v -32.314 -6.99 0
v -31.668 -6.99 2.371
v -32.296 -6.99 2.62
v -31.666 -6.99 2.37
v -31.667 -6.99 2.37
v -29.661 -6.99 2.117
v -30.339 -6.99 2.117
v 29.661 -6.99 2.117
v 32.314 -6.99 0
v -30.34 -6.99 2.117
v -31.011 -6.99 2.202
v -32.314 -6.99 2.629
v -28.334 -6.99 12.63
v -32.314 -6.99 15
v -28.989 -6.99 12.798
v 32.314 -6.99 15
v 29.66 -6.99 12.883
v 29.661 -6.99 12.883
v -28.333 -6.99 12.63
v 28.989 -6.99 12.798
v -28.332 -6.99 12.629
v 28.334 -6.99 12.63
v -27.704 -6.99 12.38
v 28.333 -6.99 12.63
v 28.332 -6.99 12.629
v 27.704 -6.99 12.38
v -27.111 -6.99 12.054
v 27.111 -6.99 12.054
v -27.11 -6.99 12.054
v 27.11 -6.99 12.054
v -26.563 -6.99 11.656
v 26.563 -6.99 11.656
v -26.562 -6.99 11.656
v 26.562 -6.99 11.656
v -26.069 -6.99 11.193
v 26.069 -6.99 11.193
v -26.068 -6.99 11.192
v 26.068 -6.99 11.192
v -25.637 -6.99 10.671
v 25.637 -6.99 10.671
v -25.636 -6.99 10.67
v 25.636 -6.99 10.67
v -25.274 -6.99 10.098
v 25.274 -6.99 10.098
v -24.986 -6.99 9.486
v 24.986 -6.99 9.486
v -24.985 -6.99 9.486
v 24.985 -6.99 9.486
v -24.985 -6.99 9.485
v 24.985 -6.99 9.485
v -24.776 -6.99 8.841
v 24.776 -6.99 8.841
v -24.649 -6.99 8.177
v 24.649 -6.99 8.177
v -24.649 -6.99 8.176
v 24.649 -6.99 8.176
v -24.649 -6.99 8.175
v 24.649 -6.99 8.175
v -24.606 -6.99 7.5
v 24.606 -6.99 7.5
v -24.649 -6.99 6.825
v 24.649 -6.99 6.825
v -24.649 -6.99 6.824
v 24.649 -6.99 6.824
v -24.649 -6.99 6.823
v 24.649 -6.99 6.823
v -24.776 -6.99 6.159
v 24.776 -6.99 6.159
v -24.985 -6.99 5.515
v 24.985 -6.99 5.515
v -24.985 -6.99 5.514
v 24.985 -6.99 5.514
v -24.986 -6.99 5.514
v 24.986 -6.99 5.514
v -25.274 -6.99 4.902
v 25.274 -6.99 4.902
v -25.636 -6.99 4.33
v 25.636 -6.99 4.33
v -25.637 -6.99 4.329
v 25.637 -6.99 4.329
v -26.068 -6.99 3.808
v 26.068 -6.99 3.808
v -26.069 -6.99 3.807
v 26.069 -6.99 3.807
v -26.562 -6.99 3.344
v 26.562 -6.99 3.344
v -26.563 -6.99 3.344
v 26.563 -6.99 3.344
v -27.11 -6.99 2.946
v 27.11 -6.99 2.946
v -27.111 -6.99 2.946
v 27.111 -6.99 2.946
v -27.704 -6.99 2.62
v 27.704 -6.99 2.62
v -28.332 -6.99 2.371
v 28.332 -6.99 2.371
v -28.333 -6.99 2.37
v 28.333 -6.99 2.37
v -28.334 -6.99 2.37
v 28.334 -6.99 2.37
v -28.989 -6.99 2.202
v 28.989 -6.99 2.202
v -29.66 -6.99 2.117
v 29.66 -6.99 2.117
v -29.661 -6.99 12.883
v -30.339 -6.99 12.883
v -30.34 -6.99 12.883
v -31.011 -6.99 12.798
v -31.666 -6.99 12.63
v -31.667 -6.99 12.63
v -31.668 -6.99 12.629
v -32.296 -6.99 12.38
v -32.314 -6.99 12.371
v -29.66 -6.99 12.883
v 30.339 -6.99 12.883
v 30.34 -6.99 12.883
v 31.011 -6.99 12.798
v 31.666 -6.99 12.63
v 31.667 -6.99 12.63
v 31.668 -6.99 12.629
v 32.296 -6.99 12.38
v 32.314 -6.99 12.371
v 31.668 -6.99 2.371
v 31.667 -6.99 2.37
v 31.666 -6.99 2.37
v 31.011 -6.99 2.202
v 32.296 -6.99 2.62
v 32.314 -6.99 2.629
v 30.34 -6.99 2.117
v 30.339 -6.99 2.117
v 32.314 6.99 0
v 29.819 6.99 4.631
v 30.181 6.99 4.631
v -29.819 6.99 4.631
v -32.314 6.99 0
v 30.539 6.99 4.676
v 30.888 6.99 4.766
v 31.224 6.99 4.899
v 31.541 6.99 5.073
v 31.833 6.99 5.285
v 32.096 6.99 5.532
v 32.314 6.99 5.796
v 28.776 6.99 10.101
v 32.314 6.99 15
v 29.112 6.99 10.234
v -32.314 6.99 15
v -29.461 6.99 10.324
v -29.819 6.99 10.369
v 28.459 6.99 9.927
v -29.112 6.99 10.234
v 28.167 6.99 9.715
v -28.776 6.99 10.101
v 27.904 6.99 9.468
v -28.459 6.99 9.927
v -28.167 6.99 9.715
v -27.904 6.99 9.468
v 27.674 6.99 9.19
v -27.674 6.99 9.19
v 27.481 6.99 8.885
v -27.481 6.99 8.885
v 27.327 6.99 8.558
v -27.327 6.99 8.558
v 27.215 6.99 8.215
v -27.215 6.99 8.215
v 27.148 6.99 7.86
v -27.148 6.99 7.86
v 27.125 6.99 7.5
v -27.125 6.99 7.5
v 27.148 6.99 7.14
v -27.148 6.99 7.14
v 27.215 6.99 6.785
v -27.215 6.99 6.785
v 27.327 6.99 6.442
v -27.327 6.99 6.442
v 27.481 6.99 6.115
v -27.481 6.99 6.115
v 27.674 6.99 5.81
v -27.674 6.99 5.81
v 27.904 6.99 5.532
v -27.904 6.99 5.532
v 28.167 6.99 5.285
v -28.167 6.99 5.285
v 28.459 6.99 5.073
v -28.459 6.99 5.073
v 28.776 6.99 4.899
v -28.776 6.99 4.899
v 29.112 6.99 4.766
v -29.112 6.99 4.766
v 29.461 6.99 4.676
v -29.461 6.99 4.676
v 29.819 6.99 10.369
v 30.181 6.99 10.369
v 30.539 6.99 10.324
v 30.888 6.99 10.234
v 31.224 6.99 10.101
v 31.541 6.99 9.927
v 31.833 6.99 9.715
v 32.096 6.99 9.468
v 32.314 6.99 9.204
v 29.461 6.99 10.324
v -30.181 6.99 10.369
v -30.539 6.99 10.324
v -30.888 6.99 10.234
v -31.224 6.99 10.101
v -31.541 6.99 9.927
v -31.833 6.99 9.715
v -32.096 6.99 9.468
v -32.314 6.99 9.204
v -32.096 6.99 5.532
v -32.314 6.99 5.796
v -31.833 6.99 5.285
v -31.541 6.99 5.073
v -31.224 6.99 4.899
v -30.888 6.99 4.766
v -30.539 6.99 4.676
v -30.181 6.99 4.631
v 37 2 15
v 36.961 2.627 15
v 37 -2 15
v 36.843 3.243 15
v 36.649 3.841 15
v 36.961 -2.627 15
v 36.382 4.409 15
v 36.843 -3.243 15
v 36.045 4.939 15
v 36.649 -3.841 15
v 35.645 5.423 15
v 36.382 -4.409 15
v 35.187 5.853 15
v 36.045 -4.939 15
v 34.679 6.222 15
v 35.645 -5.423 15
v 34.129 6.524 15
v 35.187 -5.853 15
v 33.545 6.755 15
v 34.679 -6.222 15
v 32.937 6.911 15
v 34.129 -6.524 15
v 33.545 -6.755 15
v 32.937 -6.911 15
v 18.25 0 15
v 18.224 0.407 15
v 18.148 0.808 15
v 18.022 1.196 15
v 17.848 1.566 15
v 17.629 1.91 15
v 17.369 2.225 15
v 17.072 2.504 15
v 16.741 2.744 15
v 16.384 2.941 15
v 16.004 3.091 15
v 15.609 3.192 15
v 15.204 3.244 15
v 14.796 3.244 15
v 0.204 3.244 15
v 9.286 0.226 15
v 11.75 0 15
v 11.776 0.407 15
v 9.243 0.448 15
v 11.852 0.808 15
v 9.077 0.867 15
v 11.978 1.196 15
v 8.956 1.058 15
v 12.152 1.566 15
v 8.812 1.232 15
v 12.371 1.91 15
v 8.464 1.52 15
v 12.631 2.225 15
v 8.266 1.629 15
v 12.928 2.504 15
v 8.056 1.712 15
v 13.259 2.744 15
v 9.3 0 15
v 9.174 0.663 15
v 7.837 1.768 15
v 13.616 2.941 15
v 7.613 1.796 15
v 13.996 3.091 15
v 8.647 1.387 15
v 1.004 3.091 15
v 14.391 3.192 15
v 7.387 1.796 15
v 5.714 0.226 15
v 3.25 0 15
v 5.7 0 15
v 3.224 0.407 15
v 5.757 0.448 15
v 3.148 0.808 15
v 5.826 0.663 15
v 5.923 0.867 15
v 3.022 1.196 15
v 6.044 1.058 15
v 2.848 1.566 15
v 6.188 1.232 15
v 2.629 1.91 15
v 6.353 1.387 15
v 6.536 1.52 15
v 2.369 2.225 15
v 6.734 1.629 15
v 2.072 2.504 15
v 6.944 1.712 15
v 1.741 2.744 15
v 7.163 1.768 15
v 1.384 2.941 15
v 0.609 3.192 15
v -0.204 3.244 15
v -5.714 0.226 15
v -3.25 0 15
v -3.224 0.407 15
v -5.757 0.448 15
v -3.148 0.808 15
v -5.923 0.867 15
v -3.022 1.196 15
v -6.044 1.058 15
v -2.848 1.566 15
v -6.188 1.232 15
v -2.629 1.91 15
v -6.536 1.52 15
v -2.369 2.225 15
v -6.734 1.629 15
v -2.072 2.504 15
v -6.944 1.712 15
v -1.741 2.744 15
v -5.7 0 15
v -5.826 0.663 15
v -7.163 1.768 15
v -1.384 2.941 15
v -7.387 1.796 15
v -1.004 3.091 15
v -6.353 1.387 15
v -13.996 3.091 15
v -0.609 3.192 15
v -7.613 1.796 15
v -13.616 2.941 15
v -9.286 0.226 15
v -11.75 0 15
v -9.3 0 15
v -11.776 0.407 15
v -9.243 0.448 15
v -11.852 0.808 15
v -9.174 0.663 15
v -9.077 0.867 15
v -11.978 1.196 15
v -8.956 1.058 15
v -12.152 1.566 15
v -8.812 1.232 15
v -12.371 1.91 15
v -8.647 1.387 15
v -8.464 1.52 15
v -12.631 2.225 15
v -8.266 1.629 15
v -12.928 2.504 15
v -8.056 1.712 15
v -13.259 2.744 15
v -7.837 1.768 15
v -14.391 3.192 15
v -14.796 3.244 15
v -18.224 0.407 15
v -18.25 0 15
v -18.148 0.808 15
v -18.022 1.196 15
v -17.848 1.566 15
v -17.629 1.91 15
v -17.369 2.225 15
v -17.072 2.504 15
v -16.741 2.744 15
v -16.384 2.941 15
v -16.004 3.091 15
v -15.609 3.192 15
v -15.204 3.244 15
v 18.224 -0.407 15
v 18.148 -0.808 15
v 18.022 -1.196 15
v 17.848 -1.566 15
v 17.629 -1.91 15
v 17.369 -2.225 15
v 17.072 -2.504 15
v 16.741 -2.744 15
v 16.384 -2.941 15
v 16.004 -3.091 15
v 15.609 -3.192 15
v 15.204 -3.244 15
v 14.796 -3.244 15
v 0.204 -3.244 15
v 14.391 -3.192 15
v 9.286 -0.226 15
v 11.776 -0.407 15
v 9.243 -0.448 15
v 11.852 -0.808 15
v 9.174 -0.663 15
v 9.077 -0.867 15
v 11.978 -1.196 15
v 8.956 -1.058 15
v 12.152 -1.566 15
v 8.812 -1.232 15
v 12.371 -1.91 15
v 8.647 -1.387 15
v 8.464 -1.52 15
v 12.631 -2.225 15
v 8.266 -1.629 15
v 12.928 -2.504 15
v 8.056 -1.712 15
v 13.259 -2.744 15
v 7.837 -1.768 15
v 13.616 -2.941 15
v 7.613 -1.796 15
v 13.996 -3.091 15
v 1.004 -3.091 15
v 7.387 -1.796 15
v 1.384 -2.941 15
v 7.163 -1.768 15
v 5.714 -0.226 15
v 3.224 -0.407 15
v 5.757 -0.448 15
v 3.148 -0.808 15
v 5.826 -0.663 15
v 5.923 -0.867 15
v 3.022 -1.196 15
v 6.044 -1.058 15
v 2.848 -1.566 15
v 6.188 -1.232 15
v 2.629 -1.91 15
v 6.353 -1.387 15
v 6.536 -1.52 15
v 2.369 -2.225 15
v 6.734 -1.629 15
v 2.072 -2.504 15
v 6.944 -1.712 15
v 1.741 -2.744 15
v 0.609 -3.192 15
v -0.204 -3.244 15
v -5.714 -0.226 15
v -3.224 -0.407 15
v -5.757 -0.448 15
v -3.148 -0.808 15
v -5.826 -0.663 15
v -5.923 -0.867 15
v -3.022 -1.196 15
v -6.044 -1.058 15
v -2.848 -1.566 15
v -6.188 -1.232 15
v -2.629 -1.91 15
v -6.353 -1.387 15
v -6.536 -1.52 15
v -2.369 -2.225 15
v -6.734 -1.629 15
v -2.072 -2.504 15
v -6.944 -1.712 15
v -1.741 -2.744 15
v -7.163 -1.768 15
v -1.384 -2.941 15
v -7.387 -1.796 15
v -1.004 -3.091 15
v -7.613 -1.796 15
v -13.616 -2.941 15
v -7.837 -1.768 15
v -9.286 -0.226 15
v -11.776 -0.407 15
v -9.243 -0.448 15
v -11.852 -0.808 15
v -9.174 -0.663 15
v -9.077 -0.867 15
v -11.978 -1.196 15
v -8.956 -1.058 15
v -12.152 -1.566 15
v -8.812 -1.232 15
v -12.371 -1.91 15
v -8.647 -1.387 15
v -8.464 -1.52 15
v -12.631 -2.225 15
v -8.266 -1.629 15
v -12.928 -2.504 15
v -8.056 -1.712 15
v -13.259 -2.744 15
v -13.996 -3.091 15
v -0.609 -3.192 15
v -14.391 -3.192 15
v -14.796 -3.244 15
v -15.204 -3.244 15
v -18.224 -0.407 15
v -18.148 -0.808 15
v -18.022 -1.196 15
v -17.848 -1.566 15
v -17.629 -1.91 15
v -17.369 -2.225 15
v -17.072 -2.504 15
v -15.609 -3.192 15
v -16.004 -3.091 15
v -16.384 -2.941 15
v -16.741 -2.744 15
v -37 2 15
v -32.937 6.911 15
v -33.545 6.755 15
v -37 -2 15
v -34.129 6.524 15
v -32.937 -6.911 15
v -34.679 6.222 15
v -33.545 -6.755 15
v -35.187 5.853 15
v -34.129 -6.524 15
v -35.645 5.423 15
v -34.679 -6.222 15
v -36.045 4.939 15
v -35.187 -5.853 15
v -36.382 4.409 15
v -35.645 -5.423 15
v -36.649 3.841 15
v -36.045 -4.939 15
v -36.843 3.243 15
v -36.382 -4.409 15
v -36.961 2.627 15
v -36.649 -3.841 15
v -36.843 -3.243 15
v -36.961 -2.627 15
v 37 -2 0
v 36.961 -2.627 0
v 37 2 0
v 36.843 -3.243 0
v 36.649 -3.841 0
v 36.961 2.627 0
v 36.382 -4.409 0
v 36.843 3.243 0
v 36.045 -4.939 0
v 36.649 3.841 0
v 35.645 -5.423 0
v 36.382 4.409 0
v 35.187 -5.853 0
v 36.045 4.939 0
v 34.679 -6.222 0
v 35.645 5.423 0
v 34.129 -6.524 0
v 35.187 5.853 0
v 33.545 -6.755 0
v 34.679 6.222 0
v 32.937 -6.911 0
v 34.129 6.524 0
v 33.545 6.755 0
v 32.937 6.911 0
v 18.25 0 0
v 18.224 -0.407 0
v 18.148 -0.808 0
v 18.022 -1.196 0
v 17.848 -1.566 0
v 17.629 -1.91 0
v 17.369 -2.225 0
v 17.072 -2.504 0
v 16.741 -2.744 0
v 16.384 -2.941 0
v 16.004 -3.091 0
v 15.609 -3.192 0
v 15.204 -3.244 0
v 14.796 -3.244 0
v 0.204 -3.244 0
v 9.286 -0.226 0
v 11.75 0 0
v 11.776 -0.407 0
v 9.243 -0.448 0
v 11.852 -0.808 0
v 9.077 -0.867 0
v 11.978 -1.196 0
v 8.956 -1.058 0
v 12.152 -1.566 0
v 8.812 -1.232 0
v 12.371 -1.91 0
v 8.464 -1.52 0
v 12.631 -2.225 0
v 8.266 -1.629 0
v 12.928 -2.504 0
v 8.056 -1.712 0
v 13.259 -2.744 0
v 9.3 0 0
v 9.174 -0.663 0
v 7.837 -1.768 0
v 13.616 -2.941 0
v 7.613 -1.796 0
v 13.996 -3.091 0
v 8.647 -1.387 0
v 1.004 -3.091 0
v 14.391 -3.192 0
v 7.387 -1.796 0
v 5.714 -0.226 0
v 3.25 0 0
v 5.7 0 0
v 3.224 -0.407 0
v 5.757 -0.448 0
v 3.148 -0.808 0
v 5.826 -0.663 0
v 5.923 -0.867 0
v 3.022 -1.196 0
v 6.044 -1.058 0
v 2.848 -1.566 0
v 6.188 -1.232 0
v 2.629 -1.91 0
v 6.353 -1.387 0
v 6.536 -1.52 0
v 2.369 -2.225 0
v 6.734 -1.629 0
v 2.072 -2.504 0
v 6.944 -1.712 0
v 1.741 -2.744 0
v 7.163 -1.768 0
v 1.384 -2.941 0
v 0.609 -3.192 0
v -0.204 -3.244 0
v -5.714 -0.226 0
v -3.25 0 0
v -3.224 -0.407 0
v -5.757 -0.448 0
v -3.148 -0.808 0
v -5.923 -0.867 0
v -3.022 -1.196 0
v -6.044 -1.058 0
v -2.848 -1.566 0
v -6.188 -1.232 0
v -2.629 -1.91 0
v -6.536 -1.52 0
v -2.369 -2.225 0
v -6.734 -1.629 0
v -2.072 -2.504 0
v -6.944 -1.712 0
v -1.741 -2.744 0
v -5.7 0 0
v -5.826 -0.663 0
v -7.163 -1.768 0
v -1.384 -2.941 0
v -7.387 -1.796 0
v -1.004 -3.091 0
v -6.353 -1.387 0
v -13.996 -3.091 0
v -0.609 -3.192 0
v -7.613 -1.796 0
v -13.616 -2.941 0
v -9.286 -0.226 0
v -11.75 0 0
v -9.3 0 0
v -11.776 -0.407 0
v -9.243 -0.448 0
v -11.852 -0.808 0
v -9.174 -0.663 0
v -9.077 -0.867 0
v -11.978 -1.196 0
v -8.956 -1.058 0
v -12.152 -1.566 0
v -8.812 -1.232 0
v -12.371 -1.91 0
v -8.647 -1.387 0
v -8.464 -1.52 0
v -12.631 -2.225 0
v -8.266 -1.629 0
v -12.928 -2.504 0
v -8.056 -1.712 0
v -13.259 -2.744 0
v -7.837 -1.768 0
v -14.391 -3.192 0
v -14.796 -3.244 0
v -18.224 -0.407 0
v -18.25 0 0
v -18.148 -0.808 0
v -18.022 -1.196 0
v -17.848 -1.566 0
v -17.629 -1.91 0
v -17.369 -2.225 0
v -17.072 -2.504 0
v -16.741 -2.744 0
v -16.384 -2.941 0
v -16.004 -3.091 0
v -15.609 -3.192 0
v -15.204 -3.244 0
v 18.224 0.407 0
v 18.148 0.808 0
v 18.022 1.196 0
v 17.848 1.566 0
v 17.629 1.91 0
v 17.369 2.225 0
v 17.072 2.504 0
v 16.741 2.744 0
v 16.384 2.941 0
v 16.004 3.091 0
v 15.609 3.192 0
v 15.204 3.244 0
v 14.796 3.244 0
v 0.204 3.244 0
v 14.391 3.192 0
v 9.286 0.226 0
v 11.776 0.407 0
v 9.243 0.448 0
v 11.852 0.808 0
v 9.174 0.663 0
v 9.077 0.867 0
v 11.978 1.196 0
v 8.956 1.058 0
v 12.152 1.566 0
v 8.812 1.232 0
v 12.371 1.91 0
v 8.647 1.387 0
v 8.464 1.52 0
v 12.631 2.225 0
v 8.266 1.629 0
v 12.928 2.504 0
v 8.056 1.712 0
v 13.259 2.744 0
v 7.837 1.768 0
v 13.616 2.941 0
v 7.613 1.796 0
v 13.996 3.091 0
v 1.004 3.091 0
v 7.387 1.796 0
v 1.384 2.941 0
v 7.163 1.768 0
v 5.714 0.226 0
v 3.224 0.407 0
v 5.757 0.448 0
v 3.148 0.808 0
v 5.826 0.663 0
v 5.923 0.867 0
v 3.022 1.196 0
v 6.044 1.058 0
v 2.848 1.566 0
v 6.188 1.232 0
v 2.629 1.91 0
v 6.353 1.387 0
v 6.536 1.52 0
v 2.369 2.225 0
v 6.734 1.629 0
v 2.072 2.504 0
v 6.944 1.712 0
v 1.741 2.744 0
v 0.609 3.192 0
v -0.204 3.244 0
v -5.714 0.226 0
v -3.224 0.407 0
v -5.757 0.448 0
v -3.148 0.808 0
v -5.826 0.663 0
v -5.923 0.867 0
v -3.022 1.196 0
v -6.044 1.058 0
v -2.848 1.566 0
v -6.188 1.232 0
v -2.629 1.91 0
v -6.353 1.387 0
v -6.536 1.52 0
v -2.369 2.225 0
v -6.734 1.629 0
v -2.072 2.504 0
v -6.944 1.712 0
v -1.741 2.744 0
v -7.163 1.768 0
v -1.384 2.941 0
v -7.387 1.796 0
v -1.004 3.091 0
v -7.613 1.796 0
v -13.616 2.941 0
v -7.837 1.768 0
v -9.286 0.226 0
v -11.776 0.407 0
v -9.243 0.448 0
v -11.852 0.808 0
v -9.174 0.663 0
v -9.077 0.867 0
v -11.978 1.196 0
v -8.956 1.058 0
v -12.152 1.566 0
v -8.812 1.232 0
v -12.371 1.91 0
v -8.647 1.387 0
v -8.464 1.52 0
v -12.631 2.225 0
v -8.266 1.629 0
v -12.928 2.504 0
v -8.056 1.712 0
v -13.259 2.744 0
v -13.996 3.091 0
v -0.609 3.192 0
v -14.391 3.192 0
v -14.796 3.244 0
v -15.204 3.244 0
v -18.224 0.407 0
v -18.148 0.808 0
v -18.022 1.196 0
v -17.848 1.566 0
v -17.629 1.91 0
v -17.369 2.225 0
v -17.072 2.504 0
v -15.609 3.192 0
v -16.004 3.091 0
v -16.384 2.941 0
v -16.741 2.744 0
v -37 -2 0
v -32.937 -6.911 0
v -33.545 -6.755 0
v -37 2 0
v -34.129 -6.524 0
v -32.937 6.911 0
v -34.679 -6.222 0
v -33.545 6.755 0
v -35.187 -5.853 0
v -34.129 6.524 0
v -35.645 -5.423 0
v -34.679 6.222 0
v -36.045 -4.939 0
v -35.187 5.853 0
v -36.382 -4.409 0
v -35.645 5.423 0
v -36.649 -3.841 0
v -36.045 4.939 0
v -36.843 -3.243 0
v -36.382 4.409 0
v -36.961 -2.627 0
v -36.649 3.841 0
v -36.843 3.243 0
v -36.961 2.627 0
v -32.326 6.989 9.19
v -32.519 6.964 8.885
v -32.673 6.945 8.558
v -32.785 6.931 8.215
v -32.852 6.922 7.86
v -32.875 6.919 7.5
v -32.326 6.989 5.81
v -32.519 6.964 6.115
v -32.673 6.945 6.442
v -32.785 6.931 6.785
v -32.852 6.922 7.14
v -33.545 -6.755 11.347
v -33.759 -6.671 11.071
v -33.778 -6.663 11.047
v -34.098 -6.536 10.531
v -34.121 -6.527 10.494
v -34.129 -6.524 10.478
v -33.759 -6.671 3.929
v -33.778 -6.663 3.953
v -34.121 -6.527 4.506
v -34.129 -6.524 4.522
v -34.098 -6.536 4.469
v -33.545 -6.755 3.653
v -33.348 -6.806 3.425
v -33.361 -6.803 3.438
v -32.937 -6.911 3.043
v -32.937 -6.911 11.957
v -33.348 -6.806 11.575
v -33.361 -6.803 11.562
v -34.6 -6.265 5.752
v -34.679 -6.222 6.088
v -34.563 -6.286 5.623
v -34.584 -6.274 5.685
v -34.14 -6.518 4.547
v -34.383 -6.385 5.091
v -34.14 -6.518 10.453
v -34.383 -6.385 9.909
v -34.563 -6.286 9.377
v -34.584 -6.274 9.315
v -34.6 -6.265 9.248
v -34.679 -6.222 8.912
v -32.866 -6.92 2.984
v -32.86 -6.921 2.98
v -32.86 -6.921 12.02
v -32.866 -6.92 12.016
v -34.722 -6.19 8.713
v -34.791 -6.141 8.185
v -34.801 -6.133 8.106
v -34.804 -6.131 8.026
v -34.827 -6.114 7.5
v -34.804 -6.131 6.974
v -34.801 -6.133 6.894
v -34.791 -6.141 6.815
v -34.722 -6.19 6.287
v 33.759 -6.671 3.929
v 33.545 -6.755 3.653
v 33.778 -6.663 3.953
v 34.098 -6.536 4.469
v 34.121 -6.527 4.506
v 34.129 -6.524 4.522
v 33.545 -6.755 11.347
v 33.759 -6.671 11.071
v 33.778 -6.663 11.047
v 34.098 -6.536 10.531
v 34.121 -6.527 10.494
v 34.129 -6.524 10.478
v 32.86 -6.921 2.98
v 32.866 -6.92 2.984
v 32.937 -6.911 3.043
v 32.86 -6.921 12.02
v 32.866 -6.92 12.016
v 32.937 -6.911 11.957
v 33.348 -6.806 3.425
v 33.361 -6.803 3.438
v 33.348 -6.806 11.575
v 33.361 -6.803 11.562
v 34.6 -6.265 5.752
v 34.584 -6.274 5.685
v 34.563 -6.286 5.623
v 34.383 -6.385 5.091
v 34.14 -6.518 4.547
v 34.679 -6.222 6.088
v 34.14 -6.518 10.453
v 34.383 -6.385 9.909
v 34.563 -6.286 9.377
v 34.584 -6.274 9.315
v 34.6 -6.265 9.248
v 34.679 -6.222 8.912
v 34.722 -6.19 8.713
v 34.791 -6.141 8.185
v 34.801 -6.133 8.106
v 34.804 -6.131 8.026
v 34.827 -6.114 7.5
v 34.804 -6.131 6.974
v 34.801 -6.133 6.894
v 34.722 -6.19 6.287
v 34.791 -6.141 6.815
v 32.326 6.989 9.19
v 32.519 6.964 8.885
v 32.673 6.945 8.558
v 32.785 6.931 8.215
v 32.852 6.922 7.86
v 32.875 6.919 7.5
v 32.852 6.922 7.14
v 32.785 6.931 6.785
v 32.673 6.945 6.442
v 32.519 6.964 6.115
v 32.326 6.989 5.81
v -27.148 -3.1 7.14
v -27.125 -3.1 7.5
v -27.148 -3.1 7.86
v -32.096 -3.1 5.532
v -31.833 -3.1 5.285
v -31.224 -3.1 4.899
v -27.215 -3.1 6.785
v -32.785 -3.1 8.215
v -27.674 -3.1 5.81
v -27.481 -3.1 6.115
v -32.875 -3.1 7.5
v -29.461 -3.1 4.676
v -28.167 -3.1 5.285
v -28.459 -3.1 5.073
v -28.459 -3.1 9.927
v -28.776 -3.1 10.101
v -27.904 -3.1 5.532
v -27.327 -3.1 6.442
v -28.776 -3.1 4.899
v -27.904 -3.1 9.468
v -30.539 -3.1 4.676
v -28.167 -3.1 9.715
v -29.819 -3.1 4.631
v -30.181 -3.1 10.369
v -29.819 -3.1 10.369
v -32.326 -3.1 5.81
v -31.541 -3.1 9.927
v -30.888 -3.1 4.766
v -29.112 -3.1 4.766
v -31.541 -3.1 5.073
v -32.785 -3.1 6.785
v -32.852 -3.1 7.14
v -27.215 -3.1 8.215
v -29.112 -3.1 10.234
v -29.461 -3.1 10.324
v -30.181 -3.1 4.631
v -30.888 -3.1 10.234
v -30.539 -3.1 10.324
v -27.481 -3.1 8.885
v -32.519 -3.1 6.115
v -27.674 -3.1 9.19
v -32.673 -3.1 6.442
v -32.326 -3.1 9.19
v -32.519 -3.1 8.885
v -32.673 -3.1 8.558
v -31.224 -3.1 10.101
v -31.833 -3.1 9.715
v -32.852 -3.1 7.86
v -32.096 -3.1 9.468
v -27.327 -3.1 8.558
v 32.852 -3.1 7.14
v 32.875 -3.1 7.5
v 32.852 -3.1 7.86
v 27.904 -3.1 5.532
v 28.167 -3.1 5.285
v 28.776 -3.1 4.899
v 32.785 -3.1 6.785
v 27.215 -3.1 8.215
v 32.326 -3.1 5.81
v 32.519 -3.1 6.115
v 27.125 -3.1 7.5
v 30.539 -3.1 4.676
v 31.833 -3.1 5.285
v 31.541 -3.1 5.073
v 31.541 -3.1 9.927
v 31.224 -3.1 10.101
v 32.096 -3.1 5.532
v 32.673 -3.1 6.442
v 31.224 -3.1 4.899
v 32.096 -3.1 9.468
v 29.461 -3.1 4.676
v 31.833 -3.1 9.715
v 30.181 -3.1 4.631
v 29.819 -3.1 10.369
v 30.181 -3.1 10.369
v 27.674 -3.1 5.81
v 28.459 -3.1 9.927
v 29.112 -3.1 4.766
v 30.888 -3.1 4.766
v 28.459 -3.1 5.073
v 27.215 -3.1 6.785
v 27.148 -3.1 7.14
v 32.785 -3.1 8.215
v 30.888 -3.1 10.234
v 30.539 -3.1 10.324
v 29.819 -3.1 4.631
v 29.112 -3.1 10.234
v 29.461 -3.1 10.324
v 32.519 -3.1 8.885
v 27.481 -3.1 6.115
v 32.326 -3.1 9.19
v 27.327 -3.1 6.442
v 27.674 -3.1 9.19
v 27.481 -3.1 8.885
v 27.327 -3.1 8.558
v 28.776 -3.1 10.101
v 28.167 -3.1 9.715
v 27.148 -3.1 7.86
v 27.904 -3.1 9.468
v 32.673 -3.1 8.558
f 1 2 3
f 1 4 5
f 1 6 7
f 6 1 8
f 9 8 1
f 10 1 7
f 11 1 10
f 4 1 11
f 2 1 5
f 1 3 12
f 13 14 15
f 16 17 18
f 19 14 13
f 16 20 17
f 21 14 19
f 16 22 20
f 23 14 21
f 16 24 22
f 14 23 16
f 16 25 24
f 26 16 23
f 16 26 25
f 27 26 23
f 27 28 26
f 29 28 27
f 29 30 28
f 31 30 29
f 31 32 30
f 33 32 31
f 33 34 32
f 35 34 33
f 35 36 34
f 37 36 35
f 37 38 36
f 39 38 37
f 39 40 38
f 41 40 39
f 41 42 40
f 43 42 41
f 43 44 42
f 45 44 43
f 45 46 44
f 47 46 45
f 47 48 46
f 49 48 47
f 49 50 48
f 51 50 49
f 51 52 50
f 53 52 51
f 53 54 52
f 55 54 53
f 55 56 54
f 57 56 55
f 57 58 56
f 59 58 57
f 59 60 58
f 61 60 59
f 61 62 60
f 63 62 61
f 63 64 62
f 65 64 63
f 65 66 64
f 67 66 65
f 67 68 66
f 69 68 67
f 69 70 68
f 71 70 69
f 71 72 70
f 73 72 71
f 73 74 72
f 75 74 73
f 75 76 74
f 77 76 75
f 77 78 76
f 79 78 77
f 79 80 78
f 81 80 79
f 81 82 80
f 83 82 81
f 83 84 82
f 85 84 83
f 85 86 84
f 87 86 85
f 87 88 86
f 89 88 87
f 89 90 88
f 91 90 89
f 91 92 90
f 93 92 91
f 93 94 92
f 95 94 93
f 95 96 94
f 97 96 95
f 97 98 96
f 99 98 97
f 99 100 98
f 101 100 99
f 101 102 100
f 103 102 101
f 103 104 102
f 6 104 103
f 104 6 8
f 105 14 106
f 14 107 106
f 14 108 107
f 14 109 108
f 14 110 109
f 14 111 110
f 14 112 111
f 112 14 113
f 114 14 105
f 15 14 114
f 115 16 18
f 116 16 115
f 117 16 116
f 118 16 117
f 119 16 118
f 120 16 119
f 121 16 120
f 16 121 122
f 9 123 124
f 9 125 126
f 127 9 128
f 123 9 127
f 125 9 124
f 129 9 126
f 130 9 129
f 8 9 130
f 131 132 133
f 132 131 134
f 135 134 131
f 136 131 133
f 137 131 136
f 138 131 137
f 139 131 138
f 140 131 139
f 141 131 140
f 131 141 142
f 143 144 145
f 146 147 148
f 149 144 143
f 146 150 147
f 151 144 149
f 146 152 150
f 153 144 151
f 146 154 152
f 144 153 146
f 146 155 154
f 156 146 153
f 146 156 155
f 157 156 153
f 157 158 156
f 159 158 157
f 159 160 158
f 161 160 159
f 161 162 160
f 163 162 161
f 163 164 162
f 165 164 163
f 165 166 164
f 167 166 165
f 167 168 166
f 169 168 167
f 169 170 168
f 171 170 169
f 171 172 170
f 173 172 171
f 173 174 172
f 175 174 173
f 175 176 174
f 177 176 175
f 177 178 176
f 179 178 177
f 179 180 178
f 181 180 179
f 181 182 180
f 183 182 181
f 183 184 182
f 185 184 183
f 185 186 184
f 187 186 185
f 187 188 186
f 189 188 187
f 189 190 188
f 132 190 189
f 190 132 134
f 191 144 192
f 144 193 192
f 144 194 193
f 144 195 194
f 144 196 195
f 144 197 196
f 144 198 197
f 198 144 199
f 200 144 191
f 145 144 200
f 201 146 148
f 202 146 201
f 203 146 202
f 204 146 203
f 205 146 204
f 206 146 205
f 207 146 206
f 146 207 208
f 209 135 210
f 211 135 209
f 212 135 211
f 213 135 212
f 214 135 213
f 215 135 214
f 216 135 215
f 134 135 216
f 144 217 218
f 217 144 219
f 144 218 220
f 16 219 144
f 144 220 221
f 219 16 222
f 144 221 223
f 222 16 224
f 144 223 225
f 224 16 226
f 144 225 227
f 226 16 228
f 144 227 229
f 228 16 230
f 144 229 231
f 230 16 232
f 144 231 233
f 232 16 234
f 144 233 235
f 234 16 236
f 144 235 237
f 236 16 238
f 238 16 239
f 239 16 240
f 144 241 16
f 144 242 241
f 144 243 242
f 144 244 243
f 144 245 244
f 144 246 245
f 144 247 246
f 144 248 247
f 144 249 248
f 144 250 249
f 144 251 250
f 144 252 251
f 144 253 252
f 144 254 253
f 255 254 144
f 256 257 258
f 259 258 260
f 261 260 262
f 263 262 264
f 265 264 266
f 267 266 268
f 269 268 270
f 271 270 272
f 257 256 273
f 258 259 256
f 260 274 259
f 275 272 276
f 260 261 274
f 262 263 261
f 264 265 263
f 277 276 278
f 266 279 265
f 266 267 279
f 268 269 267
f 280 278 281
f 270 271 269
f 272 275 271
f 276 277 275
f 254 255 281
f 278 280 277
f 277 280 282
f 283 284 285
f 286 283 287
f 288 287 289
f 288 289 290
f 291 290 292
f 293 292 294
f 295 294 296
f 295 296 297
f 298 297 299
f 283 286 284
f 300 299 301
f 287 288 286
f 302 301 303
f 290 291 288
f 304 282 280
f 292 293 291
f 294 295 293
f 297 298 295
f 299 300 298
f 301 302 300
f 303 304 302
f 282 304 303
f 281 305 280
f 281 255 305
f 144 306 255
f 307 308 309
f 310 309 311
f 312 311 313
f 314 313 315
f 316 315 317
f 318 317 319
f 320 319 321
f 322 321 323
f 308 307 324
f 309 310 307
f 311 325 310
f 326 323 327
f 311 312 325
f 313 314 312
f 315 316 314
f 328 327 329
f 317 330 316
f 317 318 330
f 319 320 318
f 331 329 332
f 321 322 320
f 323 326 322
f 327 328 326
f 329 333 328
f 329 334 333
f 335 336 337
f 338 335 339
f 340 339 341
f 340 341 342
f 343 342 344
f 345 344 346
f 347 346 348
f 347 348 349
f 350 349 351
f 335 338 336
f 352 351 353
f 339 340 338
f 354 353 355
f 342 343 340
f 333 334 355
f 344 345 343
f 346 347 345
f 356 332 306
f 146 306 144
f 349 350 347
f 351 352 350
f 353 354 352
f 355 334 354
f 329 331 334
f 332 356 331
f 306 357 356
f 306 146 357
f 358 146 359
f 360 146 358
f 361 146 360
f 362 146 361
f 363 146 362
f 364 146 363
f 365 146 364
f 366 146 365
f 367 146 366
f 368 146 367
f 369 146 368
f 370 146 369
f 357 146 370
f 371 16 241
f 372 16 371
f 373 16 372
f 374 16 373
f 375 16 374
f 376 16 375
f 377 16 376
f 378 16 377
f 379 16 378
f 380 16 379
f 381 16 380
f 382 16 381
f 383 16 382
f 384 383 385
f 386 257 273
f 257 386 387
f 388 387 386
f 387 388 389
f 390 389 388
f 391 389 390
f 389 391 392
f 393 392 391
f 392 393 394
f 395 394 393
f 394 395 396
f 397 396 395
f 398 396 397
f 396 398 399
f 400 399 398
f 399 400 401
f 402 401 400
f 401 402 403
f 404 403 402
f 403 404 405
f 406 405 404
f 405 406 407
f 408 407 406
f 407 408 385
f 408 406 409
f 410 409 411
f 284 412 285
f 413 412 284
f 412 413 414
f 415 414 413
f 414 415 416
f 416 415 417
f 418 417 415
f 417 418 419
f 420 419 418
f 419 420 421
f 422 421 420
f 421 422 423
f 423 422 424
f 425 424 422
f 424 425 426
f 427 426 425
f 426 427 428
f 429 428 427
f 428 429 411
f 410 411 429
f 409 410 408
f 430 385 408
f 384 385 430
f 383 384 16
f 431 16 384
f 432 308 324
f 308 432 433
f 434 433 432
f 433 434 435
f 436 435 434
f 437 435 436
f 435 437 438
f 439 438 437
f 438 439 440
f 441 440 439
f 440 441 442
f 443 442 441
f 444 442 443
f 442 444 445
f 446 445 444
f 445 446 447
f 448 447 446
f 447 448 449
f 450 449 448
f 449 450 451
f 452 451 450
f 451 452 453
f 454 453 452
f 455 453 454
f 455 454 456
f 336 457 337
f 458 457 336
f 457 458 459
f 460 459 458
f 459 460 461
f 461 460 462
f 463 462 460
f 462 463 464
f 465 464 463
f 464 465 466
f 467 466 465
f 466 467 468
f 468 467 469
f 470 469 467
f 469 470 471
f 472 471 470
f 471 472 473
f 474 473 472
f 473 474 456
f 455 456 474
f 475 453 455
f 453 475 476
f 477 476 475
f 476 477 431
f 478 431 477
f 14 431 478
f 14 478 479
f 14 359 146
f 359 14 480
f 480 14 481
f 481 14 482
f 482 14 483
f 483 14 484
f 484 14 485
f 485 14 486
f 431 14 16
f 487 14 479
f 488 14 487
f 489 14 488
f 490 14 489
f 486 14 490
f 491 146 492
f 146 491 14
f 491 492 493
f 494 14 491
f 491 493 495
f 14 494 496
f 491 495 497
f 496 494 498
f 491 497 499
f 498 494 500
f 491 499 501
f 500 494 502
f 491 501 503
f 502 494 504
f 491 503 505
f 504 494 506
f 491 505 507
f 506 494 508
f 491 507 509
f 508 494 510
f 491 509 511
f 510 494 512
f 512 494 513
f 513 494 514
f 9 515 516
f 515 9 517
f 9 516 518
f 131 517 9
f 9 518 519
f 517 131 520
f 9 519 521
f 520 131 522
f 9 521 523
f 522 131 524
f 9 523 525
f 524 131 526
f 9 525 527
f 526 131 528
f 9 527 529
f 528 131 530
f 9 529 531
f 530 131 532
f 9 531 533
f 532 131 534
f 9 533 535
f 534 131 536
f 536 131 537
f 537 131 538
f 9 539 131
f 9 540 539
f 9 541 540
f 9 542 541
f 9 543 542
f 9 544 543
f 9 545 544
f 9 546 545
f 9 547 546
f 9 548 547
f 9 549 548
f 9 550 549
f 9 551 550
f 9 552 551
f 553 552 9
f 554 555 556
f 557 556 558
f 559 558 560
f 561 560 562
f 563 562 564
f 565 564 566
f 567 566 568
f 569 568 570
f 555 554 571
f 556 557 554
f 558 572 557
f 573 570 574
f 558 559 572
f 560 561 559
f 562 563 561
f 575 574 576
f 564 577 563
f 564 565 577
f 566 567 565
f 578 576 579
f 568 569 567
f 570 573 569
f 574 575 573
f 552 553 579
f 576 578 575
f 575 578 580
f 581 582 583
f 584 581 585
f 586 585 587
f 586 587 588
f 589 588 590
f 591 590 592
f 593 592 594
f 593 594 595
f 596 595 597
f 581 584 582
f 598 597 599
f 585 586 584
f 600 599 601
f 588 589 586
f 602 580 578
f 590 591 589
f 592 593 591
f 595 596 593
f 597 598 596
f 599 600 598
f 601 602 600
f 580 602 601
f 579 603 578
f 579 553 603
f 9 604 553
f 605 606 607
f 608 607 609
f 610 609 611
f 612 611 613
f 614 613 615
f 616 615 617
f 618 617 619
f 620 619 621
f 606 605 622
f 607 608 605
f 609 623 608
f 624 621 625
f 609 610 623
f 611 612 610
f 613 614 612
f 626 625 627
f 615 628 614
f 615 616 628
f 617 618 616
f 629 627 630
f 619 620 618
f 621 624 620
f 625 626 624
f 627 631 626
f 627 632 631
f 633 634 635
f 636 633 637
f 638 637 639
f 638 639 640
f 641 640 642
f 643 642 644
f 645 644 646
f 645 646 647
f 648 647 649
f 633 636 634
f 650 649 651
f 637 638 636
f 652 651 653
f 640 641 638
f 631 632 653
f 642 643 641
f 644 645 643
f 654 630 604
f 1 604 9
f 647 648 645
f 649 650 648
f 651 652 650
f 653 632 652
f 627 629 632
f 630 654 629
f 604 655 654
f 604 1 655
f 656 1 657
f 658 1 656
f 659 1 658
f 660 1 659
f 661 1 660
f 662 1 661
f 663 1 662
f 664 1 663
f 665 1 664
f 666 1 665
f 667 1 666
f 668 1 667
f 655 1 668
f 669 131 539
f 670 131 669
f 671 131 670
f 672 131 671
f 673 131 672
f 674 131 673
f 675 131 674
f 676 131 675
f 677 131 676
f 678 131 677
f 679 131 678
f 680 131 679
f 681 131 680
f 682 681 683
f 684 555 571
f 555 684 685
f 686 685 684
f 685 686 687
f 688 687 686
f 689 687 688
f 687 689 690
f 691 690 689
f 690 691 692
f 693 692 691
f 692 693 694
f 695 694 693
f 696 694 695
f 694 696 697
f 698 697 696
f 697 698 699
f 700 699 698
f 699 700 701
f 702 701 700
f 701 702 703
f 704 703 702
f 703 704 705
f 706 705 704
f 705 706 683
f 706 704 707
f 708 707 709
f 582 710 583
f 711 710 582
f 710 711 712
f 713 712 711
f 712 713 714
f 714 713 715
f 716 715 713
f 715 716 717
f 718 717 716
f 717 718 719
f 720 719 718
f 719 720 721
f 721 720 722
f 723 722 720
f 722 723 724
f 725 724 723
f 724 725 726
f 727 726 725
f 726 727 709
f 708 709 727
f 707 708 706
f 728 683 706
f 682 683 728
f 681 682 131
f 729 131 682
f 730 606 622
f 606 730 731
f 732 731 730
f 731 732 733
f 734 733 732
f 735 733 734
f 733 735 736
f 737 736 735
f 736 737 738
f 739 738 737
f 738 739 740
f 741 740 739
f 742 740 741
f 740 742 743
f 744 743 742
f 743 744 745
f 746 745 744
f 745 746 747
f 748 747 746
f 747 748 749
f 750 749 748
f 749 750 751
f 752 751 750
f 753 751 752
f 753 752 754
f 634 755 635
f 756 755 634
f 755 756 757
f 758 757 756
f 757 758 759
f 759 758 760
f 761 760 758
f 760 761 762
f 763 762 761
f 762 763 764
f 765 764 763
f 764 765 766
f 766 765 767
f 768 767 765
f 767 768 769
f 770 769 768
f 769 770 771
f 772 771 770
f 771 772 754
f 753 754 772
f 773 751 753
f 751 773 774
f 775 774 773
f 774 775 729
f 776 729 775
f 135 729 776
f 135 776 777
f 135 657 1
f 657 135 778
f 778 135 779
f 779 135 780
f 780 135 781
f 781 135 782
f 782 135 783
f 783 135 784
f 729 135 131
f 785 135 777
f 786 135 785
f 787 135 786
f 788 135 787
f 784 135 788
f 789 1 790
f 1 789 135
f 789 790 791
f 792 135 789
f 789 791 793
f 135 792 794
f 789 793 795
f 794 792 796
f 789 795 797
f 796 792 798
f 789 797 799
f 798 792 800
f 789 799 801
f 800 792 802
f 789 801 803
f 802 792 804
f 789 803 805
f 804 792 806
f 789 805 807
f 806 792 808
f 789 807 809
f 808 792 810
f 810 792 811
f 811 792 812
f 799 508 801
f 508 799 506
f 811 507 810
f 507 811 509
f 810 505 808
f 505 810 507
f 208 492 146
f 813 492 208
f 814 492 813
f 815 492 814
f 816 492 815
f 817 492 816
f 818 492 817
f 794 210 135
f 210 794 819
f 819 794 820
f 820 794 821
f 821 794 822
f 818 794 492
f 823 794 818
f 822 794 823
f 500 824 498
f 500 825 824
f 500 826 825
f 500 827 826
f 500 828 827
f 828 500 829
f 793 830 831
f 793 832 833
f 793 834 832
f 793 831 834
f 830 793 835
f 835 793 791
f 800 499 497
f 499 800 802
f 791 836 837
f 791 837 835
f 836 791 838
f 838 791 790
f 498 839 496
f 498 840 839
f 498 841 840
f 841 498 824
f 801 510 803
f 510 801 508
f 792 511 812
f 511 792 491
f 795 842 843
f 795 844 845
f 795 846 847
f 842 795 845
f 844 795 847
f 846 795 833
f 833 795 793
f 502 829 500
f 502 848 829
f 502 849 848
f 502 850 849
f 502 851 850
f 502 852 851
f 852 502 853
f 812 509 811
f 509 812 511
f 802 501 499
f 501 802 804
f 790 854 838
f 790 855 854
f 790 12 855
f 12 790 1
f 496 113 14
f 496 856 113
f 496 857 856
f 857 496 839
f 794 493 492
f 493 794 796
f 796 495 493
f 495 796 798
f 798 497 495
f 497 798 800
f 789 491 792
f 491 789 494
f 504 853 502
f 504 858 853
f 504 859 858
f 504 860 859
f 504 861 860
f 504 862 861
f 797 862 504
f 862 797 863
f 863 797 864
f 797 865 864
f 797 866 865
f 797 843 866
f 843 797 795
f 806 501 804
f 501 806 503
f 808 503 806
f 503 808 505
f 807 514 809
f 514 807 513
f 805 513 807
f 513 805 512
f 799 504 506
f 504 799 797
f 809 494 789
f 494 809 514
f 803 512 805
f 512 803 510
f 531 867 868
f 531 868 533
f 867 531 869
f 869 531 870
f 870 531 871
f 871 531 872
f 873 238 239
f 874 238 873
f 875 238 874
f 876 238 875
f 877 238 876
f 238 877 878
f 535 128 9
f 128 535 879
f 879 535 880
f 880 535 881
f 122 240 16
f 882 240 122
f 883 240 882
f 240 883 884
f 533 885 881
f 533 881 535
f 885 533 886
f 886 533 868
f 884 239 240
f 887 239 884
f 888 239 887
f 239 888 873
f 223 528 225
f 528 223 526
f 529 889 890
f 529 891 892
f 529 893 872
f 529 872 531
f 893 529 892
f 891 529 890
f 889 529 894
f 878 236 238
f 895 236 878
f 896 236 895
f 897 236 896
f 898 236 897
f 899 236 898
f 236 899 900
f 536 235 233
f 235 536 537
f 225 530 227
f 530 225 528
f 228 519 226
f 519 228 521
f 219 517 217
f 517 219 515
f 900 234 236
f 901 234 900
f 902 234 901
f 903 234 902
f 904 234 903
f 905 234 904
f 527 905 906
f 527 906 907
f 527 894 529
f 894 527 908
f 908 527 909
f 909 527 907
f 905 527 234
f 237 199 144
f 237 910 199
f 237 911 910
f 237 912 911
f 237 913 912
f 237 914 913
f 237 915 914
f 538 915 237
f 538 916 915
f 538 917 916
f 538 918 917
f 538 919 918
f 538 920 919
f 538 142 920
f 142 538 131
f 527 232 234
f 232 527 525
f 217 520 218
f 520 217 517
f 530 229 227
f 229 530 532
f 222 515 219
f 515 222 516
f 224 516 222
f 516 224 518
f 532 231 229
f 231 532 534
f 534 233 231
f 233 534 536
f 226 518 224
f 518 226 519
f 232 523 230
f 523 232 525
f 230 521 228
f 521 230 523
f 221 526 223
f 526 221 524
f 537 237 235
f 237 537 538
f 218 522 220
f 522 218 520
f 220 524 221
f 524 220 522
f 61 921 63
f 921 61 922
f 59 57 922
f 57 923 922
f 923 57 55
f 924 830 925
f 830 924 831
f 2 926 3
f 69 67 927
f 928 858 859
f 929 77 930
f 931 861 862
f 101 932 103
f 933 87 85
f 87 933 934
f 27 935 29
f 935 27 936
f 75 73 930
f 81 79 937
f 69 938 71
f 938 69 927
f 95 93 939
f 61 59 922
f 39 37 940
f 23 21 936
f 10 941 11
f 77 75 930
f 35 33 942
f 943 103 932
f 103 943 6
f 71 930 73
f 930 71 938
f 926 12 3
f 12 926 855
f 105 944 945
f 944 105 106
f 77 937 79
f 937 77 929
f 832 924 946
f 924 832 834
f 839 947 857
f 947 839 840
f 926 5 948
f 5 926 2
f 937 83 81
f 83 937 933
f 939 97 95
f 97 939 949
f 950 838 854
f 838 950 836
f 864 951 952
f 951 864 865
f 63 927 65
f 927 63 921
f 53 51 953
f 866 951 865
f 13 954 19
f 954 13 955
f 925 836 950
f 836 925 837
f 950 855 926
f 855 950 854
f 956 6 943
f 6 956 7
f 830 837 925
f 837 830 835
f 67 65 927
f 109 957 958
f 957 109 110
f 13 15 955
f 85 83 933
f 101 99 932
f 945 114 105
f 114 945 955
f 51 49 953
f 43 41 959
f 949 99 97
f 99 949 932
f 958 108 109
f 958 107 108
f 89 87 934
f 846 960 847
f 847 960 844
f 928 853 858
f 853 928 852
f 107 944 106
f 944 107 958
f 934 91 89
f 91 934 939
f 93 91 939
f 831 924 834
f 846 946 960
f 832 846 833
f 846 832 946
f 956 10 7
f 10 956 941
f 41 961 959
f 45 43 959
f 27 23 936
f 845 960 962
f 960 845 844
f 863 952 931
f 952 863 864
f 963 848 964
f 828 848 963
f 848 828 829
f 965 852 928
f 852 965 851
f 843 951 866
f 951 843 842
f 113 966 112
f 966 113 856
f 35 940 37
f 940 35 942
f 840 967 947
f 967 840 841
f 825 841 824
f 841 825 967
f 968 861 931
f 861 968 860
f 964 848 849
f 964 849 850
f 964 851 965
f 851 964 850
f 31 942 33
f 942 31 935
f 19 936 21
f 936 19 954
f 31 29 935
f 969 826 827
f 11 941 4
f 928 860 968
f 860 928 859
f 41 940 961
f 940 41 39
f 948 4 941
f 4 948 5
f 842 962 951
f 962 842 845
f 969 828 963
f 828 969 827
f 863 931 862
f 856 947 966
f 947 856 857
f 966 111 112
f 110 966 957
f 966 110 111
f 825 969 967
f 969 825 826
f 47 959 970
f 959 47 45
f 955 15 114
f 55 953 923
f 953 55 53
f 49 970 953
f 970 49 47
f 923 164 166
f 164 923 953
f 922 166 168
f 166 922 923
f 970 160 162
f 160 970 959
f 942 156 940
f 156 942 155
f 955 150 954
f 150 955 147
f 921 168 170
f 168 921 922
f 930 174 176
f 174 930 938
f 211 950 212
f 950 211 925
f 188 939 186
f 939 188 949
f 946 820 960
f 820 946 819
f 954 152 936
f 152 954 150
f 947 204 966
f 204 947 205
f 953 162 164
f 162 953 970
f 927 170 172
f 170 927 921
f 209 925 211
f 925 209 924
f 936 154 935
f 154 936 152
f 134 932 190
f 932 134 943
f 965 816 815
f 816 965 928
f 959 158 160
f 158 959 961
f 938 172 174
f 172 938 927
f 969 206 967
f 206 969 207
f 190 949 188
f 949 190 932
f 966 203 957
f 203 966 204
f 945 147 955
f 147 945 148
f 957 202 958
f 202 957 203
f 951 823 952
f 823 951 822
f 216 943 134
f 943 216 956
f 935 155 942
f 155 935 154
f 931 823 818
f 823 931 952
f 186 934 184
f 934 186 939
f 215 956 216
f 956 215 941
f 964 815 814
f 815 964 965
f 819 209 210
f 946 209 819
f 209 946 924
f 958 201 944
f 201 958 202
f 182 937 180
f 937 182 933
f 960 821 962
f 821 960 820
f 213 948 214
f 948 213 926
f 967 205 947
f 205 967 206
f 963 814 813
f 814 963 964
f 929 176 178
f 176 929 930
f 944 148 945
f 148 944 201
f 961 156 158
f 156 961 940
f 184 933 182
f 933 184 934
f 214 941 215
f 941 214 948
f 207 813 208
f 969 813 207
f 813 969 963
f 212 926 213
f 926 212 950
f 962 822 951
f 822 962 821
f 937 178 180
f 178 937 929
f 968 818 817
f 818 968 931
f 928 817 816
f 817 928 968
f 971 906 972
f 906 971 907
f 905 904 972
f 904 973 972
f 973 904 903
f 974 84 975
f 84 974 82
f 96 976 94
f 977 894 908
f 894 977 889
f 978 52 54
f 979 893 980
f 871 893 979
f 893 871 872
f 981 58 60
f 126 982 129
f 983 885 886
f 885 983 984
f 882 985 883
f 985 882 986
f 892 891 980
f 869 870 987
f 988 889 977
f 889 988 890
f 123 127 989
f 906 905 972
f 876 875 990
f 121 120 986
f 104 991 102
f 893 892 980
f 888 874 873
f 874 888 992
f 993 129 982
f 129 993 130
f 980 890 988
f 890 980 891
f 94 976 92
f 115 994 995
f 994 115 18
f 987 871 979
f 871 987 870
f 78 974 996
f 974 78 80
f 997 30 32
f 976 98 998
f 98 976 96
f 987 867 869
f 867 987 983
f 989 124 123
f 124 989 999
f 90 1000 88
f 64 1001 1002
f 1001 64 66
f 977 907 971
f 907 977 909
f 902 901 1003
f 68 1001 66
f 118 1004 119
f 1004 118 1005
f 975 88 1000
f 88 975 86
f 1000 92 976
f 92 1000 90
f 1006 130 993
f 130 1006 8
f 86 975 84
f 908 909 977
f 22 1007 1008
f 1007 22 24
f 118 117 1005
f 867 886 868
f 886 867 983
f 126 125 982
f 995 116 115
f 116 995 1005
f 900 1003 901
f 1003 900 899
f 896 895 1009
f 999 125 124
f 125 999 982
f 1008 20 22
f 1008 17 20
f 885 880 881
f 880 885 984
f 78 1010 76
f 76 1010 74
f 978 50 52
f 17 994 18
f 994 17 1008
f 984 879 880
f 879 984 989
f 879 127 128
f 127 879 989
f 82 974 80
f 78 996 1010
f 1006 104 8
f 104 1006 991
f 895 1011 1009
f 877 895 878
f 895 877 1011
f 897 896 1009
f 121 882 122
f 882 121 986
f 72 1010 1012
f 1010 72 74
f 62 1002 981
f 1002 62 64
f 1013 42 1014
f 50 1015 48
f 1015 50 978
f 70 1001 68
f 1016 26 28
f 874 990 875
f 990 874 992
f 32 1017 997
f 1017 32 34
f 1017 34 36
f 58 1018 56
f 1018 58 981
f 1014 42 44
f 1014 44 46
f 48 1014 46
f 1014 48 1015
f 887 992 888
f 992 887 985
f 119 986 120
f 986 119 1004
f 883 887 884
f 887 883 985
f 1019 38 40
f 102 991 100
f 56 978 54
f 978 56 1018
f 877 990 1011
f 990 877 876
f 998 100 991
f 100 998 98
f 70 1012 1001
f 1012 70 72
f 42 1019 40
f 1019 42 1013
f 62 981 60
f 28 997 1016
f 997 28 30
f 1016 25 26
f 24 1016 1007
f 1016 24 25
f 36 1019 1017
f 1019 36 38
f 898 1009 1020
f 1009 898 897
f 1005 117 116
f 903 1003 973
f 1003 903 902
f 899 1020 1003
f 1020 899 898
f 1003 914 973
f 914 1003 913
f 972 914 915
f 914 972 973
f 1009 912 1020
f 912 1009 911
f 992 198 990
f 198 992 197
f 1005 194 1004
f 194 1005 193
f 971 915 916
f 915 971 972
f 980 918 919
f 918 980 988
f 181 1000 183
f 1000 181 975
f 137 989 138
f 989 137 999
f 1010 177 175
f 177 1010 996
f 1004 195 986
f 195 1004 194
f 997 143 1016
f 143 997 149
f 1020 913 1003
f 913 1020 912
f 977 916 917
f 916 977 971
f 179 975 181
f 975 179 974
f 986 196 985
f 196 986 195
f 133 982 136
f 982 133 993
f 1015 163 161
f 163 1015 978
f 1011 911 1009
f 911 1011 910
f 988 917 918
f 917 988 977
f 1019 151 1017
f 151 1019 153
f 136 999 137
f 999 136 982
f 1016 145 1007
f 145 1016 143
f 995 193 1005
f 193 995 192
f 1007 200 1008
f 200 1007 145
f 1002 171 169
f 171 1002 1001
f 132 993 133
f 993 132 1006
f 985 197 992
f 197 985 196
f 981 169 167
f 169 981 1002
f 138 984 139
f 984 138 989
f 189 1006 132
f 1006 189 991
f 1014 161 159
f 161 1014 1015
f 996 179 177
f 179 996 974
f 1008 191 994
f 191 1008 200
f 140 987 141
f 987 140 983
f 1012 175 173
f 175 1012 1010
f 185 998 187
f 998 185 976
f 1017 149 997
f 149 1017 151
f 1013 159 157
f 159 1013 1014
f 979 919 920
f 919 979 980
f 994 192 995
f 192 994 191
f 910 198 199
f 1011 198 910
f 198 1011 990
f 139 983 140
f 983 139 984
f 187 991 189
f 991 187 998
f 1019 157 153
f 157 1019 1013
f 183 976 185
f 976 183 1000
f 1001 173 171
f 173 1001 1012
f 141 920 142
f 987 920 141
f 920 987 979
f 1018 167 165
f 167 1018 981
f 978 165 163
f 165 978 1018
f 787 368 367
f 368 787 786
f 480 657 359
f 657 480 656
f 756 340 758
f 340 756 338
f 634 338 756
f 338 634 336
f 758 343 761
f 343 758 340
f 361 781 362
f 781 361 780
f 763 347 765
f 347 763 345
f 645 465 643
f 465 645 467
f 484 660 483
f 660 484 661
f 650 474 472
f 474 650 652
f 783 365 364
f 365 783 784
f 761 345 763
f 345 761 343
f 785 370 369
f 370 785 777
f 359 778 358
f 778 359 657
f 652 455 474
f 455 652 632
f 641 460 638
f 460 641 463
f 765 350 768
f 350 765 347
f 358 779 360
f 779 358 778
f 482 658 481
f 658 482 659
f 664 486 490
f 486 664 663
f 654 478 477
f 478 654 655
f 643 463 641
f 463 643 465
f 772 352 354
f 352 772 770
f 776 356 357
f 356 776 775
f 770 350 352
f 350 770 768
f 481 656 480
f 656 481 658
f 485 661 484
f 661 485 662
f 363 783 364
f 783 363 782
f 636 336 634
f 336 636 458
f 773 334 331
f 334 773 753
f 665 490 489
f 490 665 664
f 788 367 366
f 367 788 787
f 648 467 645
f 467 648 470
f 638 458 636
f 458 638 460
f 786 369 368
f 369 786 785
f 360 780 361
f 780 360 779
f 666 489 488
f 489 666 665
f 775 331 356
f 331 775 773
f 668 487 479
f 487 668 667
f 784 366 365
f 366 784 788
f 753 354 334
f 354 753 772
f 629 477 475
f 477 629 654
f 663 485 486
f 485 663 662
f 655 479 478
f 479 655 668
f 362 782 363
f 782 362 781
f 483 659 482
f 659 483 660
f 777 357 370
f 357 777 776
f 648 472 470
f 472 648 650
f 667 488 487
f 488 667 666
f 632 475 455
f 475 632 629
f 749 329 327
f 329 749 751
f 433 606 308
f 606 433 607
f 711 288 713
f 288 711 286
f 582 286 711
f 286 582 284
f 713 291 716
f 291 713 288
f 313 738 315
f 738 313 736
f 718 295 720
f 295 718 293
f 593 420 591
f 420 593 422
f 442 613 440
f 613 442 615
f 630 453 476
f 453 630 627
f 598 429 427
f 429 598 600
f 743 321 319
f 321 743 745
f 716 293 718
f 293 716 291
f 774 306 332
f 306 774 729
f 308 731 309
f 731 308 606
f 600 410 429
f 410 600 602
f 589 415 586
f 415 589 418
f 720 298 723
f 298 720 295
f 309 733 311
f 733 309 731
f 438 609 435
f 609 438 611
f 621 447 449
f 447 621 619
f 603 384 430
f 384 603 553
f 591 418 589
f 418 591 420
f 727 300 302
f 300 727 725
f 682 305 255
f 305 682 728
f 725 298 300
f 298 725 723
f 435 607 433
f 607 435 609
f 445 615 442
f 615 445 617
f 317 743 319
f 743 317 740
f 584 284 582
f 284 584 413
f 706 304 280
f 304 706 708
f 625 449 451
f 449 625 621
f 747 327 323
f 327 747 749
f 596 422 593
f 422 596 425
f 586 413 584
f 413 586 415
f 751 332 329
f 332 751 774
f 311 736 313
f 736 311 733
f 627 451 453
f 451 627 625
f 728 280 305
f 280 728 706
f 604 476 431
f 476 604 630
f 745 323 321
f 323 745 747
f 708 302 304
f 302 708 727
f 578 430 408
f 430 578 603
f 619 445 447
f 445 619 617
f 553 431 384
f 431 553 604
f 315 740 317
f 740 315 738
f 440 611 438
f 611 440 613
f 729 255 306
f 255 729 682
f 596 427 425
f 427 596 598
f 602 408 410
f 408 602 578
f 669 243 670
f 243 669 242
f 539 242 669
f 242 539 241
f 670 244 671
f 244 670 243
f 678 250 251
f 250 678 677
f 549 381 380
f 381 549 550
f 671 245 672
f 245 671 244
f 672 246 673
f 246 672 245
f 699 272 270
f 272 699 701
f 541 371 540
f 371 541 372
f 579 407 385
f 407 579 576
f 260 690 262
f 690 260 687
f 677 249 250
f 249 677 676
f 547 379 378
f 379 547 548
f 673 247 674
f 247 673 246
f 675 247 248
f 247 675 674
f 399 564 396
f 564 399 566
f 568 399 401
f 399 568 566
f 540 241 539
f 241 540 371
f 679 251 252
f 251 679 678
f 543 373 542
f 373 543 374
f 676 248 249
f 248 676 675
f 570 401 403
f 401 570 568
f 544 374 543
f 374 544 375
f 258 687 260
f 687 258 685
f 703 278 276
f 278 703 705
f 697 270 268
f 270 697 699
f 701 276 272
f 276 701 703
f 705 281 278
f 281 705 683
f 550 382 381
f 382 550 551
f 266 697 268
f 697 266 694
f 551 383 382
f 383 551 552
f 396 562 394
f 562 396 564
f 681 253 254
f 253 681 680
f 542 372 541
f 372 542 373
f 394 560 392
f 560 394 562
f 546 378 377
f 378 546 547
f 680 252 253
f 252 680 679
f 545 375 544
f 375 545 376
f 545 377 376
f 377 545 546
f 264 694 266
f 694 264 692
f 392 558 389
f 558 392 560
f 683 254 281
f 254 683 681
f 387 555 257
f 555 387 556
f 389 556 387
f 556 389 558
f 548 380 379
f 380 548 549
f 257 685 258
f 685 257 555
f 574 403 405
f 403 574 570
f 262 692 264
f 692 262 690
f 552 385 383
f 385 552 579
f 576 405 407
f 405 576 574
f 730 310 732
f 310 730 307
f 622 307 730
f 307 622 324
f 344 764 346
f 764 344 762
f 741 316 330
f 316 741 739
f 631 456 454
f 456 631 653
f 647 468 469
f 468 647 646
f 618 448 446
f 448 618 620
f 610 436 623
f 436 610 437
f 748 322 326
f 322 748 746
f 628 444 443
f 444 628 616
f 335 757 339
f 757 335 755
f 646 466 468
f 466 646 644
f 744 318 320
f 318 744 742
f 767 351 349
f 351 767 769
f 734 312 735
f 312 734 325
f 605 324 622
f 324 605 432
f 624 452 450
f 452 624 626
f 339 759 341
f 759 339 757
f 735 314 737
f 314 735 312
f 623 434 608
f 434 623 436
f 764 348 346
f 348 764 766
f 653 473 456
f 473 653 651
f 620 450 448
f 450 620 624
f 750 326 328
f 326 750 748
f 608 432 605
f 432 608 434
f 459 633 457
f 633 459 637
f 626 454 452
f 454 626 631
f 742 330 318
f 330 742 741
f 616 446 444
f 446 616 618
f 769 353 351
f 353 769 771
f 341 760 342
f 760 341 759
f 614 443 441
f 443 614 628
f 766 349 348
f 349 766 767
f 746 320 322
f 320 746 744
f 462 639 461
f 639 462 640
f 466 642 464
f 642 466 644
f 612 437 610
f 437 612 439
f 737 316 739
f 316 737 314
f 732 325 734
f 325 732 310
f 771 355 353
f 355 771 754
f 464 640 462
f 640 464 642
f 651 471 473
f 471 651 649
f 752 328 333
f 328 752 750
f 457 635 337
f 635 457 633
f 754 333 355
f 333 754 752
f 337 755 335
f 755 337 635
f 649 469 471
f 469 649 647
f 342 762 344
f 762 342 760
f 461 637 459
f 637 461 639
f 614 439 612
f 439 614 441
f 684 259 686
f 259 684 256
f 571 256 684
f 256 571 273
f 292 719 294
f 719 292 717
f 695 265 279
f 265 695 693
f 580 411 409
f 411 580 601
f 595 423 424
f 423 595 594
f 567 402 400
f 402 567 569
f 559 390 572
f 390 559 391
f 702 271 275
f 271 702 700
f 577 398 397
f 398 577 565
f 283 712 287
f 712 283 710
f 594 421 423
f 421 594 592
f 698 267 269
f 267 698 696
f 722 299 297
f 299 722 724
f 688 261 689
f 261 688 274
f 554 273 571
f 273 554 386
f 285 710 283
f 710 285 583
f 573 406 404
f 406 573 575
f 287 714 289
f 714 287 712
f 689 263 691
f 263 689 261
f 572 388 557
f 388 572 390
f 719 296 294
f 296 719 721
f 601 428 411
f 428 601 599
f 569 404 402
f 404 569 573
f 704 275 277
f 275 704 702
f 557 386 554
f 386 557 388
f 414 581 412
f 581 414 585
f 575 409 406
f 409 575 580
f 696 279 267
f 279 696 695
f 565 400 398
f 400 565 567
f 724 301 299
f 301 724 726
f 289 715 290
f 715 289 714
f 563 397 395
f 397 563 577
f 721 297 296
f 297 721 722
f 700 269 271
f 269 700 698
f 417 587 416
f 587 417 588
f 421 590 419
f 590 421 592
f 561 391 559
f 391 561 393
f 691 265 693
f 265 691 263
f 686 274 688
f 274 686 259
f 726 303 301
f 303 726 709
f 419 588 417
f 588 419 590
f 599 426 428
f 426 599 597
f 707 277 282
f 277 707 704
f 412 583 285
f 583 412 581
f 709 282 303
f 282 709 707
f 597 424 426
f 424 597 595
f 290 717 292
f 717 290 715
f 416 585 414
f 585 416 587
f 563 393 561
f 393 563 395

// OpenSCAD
$fn = 50;


difference() {
	union() {
		hull() {
			translate(v = [-17.0000000000, 2.0000000000, 0]) {
				cylinder(h = 15, r = 5);
			}
			translate(v = [17.0000000000, 2.0000000000, 0]) {
				cylinder(h = 15, r = 5);
			}
			translate(v = [-17.0000000000, -2.0000000000, 0]) {
				cylinder(h = 15, r = 5);
			}
			translate(v = [17.0000000000, -2.0000000000, 0]) {
				cylinder(h = 15, r = 5);
			}
		}
		translate(v = [-22.5000000000, 0.0000000000, 0]) {
			hull() {
				translate(v = [-9.5000000000, 2.0000000000, 0]) {
					cylinder(h = 15, r = 5);
				}
				translate(v = [9.5000000000, 2.0000000000, 0]) {
					cylinder(h = 15, r = 5);
				}
				translate(v = [-9.5000000000, -2.0000000000, 0]) {
					cylinder(h = 15, r = 5);
				}
				translate(v = [9.5000000000, -2.0000000000, 0]) {
					cylinder(h = 15, r = 5);
				}
			}
		}
		translate(v = [22.5000000000, 0.0000000000, 0]) {
			hull() {
				translate(v = [-9.5000000000, 2.0000000000, 0]) {
					cylinder(h = 15, r = 5);
				}
				translate(v = [9.5000000000, 2.0000000000, 0]) {
					cylinder(h = 15, r = 5);
				}
				translate(v = [-9.5000000000, -2.0000000000, 0]) {
					cylinder(h = 15, r = 5);
				}
				translate(v = [9.5000000000, -2.0000000000, 0]) {
					cylinder(h = 15, r = 5);
				}
			}
		}
	}
	union() {
		translate(v = [-30.0000000000, -7.0000000000, 7.5000000000]) {
			rotate(a = [90, 0, 0]) {
				difference() {
					union() {
						#translate(v = [0, 0, -14.0000000000]) {
							cylinder(h = 14, r = 2.6000000000);
						}
						#translate(v = [0, 0, -3.9000000000]) {
							cylinder(h = 3.9000000000, r1 = 2.8750000000, r2 = 5.4000000000);
						}
						#translate(v = [0, 0, -14.0000000000]) {
							cylinder(h = 14, r = 2.8750000000);
						}
						#translate(v = [0, 0, -14.0000000000]) {
							cylinder(h = 14, r = 2.6000000000);
						}
					}
					union();
				}
			}
		}
		translate(v = [30.0000000000, -7.0000000000, 7.5000000000]) {
			rotate(a = [90, 0, 0]) {
				difference() {
					union() {
						#translate(v = [0, 0, -14.0000000000]) {
							cylinder(h = 14, r = 2.6000000000);
						}
						#translate(v = [0, 0, -3.9000000000]) {
							cylinder(h = 3.9000000000, r1 = 2.8750000000, r2 = 5.4000000000);
						}
						#translate(v = [0, 0, -14.0000000000]) {
							cylinder(h = 14, r = 2.8750000000);
						}
						#translate(v = [0, 0, -14.0000000000]) {
							cylinder(h = 14, r = 2.6000000000);
						}
					}
					union();
				}
			}
		}
		translate(v = [-15.0000000000, 0.0000000000, 0]) {
			translate(v = [0, 0, -100]) {
				cylinder(h = 200, r = 3.2500000000);
			}
		}
		translate(v = [0, 0, -100]) {
			cylinder(h = 200, r = 3.2500000000);
		}
		translate(v = [15.0000000000, 0.0000000000, 0]) {
			translate(v = [0, 0, -100]) {
				cylinder(h = 200, r = 3.2500000000);
			}
		}
		translate(v = [-15.0000000000, 0.0000000000, 0]) {
			translate(v = [0, 0, -100]) {
				cylinder(h = 200, r = 1.8000000000);
			}
		}
		translate(v = [-7.5000000000, 0.0000000000, 0]) {
			translate(v = [0, 0, -100]) {
				cylinder(h = 200, r = 1.8000000000);
			}
		}
		translate(v = [0, 0, -100]) {
			cylinder(h = 200, r = 1.8000000000);
		}
		translate(v = [7.5000000000, 0.0000000000, 0]) {
			translate(v = [0, 0, -100]) {
				cylinder(h = 200, r = 1.8000000000);
			}
		}
		translate(v = [15.0000000000, 0.0000000000, 0]) {
			translate(v = [0, 0, -100]) {
				cylinder(h = 200, r = 1.8000000000);
			}
		}
	}
}
